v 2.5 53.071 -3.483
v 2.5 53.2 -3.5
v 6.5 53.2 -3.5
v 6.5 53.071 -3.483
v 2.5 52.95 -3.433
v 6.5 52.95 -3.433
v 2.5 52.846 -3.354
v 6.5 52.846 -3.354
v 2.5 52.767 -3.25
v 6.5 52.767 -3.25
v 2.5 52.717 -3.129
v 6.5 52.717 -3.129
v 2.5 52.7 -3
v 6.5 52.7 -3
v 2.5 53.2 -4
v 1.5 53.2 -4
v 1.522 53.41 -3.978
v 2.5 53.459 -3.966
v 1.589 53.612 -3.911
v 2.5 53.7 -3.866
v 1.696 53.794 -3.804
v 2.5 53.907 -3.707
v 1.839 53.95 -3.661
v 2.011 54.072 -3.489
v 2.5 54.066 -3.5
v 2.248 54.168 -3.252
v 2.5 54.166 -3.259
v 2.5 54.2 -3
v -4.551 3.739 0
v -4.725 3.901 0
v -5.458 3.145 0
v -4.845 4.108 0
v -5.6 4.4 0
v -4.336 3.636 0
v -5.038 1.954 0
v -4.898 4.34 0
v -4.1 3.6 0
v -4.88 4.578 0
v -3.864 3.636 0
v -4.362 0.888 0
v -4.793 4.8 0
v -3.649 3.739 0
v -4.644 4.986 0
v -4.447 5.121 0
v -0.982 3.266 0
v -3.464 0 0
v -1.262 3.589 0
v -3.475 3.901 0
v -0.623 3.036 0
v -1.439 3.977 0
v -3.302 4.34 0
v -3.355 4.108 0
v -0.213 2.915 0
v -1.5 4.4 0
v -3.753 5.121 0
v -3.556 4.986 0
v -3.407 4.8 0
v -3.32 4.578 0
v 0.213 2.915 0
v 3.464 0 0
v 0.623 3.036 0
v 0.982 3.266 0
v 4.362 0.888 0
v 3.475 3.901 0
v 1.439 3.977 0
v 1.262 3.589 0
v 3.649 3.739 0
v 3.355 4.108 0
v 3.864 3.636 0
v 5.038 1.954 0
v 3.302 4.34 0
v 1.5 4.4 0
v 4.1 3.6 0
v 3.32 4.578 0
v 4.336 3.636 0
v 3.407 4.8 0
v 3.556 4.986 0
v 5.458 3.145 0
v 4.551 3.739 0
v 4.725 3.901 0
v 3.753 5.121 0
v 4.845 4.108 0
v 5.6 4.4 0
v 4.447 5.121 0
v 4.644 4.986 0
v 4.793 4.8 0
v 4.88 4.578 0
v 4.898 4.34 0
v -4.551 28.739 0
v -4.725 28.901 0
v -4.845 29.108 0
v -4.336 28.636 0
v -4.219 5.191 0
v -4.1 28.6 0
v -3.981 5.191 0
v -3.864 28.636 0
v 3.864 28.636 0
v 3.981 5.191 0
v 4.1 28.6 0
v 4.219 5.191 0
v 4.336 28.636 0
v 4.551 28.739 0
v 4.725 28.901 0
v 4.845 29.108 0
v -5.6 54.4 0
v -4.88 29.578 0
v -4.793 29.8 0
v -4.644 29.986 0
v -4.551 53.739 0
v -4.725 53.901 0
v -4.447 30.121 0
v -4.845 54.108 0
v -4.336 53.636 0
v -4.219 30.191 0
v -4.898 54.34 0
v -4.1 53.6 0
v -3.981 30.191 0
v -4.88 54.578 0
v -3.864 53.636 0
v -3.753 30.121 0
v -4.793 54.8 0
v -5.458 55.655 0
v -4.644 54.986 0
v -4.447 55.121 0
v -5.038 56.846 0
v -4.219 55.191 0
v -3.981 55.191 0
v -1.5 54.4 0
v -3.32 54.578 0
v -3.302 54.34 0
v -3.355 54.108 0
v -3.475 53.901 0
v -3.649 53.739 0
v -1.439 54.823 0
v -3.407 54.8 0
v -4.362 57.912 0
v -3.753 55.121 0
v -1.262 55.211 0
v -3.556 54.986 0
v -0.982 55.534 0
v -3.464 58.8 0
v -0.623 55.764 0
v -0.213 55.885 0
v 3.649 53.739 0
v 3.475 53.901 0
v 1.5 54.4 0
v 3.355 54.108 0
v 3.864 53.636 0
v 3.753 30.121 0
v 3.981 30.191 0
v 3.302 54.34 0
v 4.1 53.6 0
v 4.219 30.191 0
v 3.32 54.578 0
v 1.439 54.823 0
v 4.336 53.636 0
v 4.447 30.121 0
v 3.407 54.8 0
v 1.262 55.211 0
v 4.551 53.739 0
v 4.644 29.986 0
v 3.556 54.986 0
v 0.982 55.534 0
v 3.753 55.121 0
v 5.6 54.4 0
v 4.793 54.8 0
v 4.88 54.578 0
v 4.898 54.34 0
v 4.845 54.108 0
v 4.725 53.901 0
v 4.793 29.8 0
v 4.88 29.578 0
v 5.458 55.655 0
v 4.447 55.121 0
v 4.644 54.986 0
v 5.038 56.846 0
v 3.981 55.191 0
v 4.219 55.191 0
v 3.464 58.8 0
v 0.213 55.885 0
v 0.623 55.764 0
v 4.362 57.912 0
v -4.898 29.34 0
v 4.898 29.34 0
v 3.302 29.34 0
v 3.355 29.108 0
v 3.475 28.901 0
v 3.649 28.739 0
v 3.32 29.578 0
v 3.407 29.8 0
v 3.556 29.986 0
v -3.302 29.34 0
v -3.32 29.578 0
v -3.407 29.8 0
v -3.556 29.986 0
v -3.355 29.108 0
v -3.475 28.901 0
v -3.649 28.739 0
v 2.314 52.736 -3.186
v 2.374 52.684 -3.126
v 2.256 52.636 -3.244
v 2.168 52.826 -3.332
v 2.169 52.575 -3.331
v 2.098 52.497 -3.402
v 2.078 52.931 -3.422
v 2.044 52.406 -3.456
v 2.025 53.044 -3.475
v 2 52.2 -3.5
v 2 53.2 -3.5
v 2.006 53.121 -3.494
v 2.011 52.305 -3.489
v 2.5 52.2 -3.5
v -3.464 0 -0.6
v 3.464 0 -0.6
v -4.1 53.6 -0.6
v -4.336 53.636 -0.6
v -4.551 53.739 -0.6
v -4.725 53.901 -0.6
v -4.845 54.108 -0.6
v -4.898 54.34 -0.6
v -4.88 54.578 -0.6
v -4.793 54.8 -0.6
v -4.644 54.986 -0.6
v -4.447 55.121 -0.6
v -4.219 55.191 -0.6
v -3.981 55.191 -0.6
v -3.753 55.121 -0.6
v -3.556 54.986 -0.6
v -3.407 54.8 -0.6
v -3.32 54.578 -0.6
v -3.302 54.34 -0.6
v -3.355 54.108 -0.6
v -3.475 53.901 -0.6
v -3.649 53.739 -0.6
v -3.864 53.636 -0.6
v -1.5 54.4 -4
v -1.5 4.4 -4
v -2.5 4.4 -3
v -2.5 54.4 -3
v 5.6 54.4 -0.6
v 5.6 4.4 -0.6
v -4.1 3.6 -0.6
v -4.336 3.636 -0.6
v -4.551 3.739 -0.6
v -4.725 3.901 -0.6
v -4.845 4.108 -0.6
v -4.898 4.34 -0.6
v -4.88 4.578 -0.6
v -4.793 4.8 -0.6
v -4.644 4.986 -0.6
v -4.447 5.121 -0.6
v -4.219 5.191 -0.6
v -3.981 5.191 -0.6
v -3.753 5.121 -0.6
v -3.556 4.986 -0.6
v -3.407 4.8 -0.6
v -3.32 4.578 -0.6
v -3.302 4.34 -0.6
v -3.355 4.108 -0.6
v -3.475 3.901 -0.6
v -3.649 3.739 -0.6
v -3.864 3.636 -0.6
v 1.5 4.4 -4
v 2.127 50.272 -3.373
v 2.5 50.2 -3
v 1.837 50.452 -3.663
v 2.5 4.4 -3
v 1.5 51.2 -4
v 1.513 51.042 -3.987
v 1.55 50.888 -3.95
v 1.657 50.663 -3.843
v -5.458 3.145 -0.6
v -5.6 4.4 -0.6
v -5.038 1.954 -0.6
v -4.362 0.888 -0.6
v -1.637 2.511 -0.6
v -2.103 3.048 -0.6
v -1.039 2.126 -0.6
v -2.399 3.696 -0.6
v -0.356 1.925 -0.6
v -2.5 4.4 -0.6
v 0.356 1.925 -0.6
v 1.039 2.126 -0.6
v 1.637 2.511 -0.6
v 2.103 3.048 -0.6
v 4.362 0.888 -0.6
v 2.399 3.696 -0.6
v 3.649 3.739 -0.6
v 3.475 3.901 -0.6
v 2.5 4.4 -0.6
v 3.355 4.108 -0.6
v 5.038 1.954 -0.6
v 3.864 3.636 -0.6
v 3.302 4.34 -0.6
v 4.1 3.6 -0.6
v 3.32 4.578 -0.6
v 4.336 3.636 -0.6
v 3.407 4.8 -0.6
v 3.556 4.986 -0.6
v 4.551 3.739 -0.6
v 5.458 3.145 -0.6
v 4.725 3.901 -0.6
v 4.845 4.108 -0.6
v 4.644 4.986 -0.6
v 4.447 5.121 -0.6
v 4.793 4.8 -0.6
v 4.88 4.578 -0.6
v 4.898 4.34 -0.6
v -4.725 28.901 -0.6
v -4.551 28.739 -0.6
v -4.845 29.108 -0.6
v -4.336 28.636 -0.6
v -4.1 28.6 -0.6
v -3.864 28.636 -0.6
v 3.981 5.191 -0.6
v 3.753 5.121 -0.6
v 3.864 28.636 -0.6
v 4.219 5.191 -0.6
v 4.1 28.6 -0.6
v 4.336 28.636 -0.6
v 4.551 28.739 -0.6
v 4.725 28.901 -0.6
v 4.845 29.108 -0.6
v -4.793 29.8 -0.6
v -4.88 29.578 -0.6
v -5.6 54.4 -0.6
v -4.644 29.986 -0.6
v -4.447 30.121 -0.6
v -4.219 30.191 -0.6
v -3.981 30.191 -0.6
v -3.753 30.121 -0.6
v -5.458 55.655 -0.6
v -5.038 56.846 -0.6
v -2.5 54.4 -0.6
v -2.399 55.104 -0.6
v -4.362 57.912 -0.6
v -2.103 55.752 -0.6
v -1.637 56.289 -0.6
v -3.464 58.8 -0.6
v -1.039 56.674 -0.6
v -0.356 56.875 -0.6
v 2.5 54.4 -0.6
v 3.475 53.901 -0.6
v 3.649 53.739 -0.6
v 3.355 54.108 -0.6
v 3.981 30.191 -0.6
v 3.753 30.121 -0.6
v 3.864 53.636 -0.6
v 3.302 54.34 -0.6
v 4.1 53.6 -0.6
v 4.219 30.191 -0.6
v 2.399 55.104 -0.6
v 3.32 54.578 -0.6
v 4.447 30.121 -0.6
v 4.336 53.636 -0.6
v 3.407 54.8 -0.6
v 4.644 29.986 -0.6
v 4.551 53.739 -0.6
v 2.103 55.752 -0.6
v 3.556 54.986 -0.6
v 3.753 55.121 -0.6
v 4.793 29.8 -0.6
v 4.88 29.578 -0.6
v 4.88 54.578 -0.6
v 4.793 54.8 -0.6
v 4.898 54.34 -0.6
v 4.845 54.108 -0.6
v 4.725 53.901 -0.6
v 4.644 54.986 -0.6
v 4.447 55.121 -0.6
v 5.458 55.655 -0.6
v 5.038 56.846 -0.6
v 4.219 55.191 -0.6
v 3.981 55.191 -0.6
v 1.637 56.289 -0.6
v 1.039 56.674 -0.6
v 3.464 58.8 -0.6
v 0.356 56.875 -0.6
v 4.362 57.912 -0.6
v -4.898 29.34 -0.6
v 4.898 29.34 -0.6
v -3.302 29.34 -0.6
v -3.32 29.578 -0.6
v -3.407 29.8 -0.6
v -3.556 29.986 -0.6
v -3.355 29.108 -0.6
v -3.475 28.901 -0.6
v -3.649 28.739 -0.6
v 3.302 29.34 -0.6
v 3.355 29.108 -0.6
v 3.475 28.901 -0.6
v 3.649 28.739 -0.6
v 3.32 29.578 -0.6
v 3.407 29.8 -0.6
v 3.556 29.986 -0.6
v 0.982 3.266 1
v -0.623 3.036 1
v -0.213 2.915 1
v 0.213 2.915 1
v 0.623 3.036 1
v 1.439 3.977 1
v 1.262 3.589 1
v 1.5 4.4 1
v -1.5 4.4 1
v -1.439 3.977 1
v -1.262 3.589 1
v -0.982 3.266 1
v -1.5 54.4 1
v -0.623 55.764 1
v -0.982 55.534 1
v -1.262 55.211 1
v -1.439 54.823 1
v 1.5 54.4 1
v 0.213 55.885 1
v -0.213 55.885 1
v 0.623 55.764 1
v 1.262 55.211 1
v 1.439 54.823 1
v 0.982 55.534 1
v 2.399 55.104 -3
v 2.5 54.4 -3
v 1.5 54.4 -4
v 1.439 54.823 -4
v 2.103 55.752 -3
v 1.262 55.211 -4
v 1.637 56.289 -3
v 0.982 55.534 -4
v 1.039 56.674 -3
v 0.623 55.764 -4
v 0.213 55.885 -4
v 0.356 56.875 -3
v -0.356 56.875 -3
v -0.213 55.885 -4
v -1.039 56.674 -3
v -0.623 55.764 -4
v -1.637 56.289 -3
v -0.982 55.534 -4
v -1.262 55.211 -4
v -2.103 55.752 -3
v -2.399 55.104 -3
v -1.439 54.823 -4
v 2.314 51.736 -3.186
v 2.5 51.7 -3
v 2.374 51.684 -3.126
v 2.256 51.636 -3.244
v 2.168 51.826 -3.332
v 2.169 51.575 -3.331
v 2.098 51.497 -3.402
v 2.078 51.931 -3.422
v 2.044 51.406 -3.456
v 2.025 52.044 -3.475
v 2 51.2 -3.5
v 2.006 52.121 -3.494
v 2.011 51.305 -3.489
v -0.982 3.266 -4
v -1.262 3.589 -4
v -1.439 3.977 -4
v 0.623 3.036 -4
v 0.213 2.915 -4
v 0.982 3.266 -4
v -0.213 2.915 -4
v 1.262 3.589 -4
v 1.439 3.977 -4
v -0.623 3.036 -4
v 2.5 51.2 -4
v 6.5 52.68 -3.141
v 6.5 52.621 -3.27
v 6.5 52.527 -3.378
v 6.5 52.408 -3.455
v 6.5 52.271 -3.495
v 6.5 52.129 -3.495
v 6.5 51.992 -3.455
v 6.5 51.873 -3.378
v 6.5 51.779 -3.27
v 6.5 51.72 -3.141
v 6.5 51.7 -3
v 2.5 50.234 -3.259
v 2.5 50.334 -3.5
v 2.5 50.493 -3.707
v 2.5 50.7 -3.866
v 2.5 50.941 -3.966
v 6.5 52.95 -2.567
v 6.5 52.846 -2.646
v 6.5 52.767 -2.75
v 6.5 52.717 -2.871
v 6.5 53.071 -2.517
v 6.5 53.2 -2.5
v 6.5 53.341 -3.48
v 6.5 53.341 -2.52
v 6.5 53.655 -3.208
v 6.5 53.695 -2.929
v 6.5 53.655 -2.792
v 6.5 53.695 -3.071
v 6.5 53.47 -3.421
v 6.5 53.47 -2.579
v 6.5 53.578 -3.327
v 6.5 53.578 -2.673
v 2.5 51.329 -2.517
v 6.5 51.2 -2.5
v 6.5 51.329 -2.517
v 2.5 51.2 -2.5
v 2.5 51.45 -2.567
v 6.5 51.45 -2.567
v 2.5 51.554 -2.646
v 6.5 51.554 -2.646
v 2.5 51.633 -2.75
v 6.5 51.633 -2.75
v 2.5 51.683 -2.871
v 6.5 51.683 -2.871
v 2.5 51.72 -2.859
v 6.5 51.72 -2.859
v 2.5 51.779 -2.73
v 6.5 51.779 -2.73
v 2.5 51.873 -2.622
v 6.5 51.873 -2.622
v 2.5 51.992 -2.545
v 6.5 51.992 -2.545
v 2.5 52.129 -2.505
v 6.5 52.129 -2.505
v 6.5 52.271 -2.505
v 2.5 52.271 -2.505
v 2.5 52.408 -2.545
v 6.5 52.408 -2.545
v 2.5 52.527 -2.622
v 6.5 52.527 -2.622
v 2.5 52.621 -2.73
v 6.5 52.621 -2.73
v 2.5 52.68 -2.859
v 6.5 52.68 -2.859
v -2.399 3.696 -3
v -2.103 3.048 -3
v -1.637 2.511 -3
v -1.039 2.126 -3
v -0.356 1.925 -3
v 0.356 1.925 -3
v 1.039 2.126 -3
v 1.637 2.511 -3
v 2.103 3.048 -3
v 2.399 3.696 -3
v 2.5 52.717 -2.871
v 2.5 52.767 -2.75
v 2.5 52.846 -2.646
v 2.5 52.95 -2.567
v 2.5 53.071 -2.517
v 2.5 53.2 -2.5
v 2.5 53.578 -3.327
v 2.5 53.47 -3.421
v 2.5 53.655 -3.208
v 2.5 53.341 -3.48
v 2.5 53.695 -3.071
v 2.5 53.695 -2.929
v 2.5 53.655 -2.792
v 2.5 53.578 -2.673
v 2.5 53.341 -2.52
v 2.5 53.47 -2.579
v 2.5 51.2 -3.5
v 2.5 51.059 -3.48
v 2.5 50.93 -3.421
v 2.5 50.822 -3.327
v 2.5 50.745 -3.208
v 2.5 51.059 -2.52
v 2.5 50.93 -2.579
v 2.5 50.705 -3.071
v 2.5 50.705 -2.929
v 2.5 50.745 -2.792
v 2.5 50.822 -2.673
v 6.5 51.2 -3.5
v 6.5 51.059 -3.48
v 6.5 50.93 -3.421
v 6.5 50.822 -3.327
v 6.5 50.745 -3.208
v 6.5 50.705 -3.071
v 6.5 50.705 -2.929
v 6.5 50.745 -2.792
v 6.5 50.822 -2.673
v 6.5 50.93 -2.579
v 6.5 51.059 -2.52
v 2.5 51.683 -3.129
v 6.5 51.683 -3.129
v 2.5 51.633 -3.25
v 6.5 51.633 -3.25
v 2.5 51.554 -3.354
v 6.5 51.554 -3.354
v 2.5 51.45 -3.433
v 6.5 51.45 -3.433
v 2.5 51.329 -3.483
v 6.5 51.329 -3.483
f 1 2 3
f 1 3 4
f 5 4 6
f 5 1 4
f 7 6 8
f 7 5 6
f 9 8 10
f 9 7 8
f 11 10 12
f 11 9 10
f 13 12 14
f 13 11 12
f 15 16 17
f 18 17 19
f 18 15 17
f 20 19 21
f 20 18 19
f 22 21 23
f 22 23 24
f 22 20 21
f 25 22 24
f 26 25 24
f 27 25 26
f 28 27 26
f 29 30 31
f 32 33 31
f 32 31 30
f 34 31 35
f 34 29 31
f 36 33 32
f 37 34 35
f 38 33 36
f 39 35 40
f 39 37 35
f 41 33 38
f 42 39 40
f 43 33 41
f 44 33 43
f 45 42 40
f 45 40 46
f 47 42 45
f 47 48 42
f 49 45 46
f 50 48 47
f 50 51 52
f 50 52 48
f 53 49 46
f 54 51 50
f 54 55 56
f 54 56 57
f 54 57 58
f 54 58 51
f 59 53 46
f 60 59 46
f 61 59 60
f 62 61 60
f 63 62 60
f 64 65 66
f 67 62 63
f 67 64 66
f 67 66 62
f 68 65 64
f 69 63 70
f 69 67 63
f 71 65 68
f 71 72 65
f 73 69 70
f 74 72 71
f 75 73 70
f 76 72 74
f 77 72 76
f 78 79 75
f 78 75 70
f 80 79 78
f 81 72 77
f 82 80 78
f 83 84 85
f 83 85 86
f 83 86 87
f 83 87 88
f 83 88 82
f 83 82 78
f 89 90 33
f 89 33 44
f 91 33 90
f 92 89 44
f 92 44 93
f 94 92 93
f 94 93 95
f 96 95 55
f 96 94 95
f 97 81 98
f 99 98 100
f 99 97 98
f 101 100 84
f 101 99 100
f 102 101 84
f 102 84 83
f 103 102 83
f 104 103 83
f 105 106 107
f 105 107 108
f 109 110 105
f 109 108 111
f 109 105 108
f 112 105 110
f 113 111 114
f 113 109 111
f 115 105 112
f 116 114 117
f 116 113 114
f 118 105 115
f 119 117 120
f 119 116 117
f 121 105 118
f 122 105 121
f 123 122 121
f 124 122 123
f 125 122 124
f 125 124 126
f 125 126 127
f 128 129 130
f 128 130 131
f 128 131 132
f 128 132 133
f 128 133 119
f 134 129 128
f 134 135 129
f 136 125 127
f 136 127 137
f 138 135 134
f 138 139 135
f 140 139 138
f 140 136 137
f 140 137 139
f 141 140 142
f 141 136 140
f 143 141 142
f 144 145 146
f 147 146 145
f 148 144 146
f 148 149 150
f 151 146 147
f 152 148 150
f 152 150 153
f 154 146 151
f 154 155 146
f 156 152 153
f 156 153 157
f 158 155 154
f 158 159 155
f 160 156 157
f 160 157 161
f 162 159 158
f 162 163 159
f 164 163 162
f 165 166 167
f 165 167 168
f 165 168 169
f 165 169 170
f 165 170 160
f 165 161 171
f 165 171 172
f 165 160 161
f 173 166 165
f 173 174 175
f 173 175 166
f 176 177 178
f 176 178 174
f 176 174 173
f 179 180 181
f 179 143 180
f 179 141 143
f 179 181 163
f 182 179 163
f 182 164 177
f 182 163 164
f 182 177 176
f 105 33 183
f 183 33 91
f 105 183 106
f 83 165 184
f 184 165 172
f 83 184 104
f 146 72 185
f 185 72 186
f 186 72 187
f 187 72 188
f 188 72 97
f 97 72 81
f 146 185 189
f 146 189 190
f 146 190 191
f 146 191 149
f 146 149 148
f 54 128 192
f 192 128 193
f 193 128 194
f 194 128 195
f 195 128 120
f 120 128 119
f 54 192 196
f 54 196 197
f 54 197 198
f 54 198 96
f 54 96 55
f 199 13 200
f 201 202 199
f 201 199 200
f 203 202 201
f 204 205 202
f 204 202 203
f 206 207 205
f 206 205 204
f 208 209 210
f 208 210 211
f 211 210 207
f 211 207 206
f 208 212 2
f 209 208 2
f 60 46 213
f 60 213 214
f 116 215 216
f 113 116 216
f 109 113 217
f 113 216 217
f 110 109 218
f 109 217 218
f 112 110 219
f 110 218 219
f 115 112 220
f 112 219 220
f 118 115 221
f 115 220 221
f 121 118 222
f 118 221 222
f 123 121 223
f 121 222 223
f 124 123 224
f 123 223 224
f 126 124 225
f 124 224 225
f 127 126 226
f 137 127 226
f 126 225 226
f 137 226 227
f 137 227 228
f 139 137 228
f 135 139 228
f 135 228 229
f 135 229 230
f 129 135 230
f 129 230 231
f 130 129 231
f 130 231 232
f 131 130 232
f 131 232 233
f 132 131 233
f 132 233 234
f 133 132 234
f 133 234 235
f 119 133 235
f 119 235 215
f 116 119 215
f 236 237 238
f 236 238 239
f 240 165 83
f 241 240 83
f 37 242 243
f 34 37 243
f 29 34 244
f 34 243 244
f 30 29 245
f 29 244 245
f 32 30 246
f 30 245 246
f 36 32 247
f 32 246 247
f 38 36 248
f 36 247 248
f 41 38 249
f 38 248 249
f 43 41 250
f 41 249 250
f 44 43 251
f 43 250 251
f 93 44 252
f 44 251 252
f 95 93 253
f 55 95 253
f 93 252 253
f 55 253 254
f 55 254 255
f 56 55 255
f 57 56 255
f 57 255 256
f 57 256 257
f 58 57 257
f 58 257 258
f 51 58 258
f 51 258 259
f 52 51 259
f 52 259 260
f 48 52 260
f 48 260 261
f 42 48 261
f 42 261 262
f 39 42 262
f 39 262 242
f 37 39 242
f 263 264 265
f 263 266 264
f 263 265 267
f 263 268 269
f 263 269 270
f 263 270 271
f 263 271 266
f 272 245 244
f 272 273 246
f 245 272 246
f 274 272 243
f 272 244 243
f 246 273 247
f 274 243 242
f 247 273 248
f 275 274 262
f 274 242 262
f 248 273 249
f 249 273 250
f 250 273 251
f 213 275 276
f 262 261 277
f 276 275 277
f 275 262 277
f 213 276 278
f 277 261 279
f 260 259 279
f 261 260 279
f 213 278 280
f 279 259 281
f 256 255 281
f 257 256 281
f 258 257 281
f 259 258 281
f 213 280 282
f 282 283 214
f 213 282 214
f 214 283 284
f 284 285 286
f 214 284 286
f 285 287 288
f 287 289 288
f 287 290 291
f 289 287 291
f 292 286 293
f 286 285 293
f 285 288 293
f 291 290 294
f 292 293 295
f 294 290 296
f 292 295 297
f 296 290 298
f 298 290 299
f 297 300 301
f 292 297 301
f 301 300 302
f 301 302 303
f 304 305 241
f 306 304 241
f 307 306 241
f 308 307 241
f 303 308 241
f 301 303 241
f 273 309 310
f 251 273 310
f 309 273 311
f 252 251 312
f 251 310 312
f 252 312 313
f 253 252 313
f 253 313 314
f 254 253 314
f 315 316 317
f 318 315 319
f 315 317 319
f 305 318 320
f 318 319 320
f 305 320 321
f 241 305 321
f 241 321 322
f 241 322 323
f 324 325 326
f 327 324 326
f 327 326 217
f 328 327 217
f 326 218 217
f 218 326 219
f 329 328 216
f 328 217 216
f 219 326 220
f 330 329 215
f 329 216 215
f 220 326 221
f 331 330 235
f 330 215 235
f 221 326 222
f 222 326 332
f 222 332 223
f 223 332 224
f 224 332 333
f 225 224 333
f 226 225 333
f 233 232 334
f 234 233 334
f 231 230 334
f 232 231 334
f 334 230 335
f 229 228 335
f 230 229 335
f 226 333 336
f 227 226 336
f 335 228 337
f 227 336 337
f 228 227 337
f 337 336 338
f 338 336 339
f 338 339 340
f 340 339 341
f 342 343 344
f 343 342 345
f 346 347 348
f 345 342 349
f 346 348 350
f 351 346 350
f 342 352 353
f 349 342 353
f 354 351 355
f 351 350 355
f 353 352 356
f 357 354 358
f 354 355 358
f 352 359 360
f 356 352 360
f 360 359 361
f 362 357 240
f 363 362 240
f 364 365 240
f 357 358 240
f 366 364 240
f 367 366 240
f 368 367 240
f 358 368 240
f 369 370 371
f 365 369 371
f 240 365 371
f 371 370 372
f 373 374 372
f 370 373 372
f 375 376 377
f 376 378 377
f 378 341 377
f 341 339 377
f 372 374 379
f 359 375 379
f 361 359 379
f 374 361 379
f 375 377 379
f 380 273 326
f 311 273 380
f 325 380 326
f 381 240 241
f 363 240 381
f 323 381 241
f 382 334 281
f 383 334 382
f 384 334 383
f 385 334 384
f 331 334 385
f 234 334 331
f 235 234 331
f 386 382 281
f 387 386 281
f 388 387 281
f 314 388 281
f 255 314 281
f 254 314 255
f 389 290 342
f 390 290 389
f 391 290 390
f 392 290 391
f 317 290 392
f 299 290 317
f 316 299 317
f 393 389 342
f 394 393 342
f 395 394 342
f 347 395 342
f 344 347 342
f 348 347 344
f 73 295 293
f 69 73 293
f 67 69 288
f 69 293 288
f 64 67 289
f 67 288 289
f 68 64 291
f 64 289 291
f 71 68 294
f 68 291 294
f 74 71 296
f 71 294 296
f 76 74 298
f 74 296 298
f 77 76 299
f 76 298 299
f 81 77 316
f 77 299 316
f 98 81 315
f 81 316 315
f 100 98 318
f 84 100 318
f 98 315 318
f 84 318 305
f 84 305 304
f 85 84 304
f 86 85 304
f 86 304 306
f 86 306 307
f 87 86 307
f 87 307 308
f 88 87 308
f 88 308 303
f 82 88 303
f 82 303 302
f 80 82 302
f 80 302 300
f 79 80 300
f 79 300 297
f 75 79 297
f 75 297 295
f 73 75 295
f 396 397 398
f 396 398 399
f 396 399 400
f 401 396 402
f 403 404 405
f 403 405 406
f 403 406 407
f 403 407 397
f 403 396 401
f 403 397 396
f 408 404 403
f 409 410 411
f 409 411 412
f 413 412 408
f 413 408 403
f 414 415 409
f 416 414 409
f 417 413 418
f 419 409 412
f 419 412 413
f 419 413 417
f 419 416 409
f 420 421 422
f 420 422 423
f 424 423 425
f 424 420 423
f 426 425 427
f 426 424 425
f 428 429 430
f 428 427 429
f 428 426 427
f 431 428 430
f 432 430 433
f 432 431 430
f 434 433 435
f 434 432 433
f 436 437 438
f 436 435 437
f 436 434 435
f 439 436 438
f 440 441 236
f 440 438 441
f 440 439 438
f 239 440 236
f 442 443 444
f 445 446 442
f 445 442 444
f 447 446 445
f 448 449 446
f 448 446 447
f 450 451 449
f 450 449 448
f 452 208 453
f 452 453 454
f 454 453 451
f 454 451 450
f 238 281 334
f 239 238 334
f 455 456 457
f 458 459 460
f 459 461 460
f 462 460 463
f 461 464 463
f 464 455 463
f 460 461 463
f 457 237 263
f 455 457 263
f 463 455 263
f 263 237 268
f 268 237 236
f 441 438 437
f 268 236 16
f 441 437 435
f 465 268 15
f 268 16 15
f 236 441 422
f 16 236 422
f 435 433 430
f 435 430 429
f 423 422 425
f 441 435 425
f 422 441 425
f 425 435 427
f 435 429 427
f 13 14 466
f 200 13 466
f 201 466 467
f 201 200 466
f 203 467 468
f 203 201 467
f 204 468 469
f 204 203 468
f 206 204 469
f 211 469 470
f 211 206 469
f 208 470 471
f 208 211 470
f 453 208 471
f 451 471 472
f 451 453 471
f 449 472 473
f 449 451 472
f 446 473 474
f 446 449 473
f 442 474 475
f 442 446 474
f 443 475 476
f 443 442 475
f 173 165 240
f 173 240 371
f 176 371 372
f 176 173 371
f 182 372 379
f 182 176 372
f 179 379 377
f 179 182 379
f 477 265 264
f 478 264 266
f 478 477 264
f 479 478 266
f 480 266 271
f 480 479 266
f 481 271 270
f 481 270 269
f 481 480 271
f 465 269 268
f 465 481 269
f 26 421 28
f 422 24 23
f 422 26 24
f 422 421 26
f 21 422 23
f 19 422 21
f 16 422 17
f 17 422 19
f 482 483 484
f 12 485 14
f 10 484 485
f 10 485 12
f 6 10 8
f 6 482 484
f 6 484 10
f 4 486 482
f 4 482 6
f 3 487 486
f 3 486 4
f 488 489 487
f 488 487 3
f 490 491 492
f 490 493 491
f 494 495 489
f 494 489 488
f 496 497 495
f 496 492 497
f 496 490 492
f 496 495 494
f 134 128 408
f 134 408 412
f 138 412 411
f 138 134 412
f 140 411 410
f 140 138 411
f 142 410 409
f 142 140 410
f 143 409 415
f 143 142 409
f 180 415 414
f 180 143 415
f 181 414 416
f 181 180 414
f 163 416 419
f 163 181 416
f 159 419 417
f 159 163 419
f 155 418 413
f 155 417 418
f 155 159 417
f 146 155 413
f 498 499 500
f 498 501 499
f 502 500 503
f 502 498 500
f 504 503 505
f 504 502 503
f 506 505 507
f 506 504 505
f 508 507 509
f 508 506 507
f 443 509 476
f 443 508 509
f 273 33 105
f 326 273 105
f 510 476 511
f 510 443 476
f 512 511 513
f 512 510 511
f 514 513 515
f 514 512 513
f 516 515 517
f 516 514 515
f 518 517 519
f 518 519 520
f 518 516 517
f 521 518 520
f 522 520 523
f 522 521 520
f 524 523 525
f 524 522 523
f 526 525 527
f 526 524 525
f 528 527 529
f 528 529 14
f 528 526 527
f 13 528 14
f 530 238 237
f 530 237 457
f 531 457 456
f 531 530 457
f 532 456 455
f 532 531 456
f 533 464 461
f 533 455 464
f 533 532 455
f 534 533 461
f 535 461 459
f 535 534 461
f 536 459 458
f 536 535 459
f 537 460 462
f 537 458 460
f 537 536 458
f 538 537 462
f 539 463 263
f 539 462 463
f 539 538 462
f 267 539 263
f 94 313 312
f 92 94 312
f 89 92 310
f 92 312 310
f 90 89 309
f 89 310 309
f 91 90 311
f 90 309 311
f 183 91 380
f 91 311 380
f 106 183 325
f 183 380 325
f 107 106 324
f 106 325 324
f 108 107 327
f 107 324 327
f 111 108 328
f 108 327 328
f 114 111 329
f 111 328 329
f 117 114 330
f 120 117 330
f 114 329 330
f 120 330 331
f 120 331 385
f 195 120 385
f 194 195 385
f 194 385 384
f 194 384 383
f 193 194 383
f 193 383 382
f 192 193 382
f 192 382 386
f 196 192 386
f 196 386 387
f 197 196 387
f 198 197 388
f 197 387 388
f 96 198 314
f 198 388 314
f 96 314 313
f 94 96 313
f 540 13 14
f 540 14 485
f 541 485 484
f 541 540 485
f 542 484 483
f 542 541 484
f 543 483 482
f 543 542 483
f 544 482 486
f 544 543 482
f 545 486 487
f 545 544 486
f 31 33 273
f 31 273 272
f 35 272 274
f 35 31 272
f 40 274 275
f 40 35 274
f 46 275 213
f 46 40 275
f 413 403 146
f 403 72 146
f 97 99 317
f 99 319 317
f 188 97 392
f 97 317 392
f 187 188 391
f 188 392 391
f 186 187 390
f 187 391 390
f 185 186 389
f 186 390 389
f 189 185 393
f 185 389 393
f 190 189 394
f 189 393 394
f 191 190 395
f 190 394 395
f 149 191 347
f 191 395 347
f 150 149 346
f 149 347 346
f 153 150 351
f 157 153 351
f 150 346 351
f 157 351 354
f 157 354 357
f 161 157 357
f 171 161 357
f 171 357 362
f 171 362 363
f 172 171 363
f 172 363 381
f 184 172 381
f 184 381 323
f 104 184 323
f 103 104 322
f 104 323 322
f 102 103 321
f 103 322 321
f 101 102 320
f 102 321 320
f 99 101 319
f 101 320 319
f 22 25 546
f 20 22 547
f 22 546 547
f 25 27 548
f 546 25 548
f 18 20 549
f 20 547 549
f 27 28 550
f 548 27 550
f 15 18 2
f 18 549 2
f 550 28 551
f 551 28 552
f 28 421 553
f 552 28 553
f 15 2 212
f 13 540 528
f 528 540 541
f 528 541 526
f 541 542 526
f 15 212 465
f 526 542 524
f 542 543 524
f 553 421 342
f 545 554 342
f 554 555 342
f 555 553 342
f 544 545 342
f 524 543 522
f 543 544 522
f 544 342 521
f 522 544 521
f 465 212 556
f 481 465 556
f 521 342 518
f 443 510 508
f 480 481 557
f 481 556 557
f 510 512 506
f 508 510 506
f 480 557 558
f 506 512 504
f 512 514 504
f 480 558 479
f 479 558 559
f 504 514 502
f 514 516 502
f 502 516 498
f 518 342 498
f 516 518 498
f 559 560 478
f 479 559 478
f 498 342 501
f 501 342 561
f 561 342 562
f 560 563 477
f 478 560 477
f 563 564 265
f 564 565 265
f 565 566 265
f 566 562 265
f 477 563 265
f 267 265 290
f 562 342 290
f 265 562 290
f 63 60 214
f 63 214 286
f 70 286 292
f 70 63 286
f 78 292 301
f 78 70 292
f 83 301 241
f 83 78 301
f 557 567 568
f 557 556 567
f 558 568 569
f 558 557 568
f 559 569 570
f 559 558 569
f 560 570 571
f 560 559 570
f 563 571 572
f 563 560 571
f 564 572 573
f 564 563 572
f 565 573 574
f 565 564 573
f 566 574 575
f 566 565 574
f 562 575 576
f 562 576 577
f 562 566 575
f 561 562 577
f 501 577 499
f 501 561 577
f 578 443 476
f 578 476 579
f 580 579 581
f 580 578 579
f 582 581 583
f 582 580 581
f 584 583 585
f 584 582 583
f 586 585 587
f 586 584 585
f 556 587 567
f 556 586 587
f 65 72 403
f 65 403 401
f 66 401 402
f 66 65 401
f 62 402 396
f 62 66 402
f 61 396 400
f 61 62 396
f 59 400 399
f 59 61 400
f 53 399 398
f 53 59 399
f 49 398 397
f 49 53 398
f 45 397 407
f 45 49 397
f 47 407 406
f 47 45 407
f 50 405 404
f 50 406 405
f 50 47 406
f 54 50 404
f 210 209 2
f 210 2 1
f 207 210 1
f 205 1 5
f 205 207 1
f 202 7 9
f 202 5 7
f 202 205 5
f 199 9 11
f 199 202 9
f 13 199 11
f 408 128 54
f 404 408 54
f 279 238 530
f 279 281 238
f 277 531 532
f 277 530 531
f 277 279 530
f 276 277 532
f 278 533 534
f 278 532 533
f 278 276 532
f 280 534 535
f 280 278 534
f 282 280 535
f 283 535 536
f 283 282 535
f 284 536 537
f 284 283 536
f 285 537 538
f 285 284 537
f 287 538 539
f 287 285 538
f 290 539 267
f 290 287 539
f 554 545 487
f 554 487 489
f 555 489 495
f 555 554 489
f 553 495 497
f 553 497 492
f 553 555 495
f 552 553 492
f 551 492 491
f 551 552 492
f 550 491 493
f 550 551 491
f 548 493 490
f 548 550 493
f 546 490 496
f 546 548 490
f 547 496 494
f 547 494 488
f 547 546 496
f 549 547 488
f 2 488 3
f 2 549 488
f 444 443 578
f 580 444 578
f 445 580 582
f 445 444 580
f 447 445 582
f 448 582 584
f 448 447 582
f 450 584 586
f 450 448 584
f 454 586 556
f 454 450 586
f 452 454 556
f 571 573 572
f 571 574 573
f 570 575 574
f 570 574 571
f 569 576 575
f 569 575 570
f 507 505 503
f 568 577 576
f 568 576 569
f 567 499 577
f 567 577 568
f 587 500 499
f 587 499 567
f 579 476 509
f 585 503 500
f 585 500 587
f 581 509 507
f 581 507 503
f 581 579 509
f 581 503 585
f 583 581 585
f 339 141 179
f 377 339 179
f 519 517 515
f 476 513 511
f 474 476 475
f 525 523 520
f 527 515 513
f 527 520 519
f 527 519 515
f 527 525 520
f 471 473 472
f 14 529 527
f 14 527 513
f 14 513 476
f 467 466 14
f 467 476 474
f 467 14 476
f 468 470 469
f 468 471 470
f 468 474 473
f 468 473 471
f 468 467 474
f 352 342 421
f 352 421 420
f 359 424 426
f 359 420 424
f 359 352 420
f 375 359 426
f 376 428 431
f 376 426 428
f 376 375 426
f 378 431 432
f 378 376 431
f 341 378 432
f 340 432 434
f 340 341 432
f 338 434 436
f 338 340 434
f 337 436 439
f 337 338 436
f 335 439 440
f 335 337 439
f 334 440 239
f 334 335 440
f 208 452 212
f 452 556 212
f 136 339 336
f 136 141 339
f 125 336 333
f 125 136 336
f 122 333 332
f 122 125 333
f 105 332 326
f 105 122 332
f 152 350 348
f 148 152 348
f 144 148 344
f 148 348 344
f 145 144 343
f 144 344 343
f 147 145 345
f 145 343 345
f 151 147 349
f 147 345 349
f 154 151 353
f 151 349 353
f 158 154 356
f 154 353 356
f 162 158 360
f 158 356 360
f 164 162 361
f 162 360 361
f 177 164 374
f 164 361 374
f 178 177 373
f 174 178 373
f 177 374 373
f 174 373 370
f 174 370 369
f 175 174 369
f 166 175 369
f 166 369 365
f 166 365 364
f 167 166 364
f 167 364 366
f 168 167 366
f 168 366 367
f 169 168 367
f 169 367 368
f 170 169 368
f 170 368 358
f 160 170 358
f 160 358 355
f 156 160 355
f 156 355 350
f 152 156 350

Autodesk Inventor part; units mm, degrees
ref_plane "YZ Plane" through (0, 0, 0) normal (1, 0, 0) x (0, 1, 0)
ref_plane "XZ Plane" through (0, 0, 0) normal (0, 1, 0) x (-1, 0, 0)
ref_plane "XY Plane" through (0, 0, 0) normal (0, 0, 1) x (1, 0, 0)
sketch "Sketch1" plane through (0, 0, 0) normal (0, 0, 1) x (1, 0, 0)
  line L0 (0, 54.4) -> (0, 4.4) construction
  line L1 (-1.5, 54.4) -> (-1.5, 4.4)
  line L2 (1.5, 4.4) -> (1.5, 54.4)
  arc A0 (1.5, 54.4) -> (-1.5, 54.4) centre (0, 54.4) ccw
  arc A1 (-1.5, 4.4) -> (1.5, 4.4) centre (0, 4.4) ccw
  line L3 (-5.6, 4.4) -> (-5.6, 54.4)
  line L4 (5.6, 54.4) -> (5.6, 4.4)
  line L5 (-4.1, 4.4) -> (-4.1, 54.4)
  arc A2 (4.1, 54.4) -> (-4.1, 54.4) centre (0, 54.4) ccw
  line L6 (4.1, 54.4) -> (4.1, 4.4)
  arc A3 (-4.1, 4.4) -> (4.1, 4.4) centre (0, 4.4) ccw
  line L7 (-2.5, 4.4) -> (-2.5, 54.4)
  arc A4 (2.5, 54.4) -> (-2.5, 54.4) centre (0, 54.4) ccw
  line L8 (2.5, 54.4) -> (2.5, 4.4)
  arc A5 (-2.5, 4.4) -> (2.5, 4.4) centre (0, 4.4) ccw
  arc A6 (5.6, 54.4) -> (3.4641, 58.8) centre (0, 54.4) ccw
  arc A7 (-3.4641, 58.8) -> (-5.6, 54.4) centre (0, 54.4) ccw
  arc A8 (-5.6, 4.4) -> (-3.4641, 0) centre (0, 4.4) ccw
  arc A9 (3.4641, 0) -> (5.6, 4.4) centre (0, 4.4) ccw
  line L9 (-3.4641, 0) -> (3.4641, 0)
  line L10 (-3.4641, 58.8) -> (3.4641, 58.8)
  point P0 (0, 0)
  point P1 (0, 1.5)
  point P2 (0, 29.4)
  point P3 (4.1, 29.4)
  point P4 (-4.1, 29.4)
  dimension "d0" = 3
  dimension "d1" = 50
  dimension "d2" = 4.1
  dimension "d3" = 2.6
  dimension "d4" = 1
extrude "Extrusion1" add sketch "Sketch1" along normal blind 1 contours A0 L2 A1 L1
extrude "Extrusion2" add sketch "Sketch1" against normal blind 4 contours A0 L2 A1 L1 | L7 A4 L8 A5
extrude "Extrusion3" add sketch "Sketch1" against normal blind 0.6 contours L3 A7 L10 A6 L4 A9 L9 A8 | L5 A2 L6 A3
chamfer "Chamfer1" distance 1 angle 45 4 edges at (2.5, 29.4, -4) (0, 1.9, -4) (-2.5, 29.4, -4) (0, 56.9, -4)
hole "Hole1" at (-4.1, 29.4, 0) at (4.1, 29.4, 0) at (-4.1, 54.4, 0) at (4.1, 54.4, 0) at (4.1, 4.4, 0) at (-4.1, 4.4, 0) direction (0, 0, -1) diameter 1.6 depth 8 tip angle 118
sketch "Sketch2" plane through (2.5, 4.4, -0.6) normal (1, 0, 0) x (0, 0, -1)
  line L0 (2.4, 50) -> (2.4, 0) projected
  line L1 (0, 50) -> (2.4, 50) projected
  line L2 (0, 50) -> (0, 0) projected
  line L3 (0, 0) -> (2.4, 0) projected
  line L4 (2.4, 48.8) -> (2.4, 46.8) construction
  line L5 (1.9, 48.8) -> (1.9, 46.8)
  line L6 (2.9, 46.8) -> (2.9, 48.8)
  arc A0 (2.9, 48.8) -> (1.9, 48.8) centre (2.4, 48.8) ccw
  arc A1 (1.9, 46.8) -> (2.9, 46.8) centre (2.4, 46.8) ccw
  line L7 (1.4, 48.8) -> (1.4, 46.8)
  arc A2 (1.4, 46.8) -> (3.4, 46.8) centre (2.4, 46.8) ccw
  line L8 (3.4, 46.8) -> (3.4, 48.8)
  arc A3 (3.4, 48.8) -> (1.4, 48.8) centre (2.4, 48.8) ccw
  circle A4 centre (2.4, 48.8) radius 0.5
  circle A5 centre (2.4, 46.8) radius 0.5
  circle A6 centre (2.4, 47.8) radius 0.5
  point P0 (-0.6, -4.4)
  dimension "d21" = 2
  dimension "d22" = 1
  dimension "d23" = 2.4
  dimension "d24" = 0
  dimension "d25" = 1.2
  dimension "d26" = 0.5
  dimension "d27" = 1
  dimension "d29" = 1
extrude "Extrusion4" add sketch "Sketch2" against normal blind 1 contours A3 L8 A2 L0 A1 L6 A0 | L0 A0 L5 A1 A2 L7 A3
extrude "Extrusion5" add sketch "Sketch2" along normal mid plane 8 contours A0 A4 L0 | L0 A4 A0 | A6 L0 | L0 A6 | A5 A1 L0 | L0 A1 A5
properties part number "ASSEMBLY_Regolith_container_level_sensor" material "Aluminum 6061"
